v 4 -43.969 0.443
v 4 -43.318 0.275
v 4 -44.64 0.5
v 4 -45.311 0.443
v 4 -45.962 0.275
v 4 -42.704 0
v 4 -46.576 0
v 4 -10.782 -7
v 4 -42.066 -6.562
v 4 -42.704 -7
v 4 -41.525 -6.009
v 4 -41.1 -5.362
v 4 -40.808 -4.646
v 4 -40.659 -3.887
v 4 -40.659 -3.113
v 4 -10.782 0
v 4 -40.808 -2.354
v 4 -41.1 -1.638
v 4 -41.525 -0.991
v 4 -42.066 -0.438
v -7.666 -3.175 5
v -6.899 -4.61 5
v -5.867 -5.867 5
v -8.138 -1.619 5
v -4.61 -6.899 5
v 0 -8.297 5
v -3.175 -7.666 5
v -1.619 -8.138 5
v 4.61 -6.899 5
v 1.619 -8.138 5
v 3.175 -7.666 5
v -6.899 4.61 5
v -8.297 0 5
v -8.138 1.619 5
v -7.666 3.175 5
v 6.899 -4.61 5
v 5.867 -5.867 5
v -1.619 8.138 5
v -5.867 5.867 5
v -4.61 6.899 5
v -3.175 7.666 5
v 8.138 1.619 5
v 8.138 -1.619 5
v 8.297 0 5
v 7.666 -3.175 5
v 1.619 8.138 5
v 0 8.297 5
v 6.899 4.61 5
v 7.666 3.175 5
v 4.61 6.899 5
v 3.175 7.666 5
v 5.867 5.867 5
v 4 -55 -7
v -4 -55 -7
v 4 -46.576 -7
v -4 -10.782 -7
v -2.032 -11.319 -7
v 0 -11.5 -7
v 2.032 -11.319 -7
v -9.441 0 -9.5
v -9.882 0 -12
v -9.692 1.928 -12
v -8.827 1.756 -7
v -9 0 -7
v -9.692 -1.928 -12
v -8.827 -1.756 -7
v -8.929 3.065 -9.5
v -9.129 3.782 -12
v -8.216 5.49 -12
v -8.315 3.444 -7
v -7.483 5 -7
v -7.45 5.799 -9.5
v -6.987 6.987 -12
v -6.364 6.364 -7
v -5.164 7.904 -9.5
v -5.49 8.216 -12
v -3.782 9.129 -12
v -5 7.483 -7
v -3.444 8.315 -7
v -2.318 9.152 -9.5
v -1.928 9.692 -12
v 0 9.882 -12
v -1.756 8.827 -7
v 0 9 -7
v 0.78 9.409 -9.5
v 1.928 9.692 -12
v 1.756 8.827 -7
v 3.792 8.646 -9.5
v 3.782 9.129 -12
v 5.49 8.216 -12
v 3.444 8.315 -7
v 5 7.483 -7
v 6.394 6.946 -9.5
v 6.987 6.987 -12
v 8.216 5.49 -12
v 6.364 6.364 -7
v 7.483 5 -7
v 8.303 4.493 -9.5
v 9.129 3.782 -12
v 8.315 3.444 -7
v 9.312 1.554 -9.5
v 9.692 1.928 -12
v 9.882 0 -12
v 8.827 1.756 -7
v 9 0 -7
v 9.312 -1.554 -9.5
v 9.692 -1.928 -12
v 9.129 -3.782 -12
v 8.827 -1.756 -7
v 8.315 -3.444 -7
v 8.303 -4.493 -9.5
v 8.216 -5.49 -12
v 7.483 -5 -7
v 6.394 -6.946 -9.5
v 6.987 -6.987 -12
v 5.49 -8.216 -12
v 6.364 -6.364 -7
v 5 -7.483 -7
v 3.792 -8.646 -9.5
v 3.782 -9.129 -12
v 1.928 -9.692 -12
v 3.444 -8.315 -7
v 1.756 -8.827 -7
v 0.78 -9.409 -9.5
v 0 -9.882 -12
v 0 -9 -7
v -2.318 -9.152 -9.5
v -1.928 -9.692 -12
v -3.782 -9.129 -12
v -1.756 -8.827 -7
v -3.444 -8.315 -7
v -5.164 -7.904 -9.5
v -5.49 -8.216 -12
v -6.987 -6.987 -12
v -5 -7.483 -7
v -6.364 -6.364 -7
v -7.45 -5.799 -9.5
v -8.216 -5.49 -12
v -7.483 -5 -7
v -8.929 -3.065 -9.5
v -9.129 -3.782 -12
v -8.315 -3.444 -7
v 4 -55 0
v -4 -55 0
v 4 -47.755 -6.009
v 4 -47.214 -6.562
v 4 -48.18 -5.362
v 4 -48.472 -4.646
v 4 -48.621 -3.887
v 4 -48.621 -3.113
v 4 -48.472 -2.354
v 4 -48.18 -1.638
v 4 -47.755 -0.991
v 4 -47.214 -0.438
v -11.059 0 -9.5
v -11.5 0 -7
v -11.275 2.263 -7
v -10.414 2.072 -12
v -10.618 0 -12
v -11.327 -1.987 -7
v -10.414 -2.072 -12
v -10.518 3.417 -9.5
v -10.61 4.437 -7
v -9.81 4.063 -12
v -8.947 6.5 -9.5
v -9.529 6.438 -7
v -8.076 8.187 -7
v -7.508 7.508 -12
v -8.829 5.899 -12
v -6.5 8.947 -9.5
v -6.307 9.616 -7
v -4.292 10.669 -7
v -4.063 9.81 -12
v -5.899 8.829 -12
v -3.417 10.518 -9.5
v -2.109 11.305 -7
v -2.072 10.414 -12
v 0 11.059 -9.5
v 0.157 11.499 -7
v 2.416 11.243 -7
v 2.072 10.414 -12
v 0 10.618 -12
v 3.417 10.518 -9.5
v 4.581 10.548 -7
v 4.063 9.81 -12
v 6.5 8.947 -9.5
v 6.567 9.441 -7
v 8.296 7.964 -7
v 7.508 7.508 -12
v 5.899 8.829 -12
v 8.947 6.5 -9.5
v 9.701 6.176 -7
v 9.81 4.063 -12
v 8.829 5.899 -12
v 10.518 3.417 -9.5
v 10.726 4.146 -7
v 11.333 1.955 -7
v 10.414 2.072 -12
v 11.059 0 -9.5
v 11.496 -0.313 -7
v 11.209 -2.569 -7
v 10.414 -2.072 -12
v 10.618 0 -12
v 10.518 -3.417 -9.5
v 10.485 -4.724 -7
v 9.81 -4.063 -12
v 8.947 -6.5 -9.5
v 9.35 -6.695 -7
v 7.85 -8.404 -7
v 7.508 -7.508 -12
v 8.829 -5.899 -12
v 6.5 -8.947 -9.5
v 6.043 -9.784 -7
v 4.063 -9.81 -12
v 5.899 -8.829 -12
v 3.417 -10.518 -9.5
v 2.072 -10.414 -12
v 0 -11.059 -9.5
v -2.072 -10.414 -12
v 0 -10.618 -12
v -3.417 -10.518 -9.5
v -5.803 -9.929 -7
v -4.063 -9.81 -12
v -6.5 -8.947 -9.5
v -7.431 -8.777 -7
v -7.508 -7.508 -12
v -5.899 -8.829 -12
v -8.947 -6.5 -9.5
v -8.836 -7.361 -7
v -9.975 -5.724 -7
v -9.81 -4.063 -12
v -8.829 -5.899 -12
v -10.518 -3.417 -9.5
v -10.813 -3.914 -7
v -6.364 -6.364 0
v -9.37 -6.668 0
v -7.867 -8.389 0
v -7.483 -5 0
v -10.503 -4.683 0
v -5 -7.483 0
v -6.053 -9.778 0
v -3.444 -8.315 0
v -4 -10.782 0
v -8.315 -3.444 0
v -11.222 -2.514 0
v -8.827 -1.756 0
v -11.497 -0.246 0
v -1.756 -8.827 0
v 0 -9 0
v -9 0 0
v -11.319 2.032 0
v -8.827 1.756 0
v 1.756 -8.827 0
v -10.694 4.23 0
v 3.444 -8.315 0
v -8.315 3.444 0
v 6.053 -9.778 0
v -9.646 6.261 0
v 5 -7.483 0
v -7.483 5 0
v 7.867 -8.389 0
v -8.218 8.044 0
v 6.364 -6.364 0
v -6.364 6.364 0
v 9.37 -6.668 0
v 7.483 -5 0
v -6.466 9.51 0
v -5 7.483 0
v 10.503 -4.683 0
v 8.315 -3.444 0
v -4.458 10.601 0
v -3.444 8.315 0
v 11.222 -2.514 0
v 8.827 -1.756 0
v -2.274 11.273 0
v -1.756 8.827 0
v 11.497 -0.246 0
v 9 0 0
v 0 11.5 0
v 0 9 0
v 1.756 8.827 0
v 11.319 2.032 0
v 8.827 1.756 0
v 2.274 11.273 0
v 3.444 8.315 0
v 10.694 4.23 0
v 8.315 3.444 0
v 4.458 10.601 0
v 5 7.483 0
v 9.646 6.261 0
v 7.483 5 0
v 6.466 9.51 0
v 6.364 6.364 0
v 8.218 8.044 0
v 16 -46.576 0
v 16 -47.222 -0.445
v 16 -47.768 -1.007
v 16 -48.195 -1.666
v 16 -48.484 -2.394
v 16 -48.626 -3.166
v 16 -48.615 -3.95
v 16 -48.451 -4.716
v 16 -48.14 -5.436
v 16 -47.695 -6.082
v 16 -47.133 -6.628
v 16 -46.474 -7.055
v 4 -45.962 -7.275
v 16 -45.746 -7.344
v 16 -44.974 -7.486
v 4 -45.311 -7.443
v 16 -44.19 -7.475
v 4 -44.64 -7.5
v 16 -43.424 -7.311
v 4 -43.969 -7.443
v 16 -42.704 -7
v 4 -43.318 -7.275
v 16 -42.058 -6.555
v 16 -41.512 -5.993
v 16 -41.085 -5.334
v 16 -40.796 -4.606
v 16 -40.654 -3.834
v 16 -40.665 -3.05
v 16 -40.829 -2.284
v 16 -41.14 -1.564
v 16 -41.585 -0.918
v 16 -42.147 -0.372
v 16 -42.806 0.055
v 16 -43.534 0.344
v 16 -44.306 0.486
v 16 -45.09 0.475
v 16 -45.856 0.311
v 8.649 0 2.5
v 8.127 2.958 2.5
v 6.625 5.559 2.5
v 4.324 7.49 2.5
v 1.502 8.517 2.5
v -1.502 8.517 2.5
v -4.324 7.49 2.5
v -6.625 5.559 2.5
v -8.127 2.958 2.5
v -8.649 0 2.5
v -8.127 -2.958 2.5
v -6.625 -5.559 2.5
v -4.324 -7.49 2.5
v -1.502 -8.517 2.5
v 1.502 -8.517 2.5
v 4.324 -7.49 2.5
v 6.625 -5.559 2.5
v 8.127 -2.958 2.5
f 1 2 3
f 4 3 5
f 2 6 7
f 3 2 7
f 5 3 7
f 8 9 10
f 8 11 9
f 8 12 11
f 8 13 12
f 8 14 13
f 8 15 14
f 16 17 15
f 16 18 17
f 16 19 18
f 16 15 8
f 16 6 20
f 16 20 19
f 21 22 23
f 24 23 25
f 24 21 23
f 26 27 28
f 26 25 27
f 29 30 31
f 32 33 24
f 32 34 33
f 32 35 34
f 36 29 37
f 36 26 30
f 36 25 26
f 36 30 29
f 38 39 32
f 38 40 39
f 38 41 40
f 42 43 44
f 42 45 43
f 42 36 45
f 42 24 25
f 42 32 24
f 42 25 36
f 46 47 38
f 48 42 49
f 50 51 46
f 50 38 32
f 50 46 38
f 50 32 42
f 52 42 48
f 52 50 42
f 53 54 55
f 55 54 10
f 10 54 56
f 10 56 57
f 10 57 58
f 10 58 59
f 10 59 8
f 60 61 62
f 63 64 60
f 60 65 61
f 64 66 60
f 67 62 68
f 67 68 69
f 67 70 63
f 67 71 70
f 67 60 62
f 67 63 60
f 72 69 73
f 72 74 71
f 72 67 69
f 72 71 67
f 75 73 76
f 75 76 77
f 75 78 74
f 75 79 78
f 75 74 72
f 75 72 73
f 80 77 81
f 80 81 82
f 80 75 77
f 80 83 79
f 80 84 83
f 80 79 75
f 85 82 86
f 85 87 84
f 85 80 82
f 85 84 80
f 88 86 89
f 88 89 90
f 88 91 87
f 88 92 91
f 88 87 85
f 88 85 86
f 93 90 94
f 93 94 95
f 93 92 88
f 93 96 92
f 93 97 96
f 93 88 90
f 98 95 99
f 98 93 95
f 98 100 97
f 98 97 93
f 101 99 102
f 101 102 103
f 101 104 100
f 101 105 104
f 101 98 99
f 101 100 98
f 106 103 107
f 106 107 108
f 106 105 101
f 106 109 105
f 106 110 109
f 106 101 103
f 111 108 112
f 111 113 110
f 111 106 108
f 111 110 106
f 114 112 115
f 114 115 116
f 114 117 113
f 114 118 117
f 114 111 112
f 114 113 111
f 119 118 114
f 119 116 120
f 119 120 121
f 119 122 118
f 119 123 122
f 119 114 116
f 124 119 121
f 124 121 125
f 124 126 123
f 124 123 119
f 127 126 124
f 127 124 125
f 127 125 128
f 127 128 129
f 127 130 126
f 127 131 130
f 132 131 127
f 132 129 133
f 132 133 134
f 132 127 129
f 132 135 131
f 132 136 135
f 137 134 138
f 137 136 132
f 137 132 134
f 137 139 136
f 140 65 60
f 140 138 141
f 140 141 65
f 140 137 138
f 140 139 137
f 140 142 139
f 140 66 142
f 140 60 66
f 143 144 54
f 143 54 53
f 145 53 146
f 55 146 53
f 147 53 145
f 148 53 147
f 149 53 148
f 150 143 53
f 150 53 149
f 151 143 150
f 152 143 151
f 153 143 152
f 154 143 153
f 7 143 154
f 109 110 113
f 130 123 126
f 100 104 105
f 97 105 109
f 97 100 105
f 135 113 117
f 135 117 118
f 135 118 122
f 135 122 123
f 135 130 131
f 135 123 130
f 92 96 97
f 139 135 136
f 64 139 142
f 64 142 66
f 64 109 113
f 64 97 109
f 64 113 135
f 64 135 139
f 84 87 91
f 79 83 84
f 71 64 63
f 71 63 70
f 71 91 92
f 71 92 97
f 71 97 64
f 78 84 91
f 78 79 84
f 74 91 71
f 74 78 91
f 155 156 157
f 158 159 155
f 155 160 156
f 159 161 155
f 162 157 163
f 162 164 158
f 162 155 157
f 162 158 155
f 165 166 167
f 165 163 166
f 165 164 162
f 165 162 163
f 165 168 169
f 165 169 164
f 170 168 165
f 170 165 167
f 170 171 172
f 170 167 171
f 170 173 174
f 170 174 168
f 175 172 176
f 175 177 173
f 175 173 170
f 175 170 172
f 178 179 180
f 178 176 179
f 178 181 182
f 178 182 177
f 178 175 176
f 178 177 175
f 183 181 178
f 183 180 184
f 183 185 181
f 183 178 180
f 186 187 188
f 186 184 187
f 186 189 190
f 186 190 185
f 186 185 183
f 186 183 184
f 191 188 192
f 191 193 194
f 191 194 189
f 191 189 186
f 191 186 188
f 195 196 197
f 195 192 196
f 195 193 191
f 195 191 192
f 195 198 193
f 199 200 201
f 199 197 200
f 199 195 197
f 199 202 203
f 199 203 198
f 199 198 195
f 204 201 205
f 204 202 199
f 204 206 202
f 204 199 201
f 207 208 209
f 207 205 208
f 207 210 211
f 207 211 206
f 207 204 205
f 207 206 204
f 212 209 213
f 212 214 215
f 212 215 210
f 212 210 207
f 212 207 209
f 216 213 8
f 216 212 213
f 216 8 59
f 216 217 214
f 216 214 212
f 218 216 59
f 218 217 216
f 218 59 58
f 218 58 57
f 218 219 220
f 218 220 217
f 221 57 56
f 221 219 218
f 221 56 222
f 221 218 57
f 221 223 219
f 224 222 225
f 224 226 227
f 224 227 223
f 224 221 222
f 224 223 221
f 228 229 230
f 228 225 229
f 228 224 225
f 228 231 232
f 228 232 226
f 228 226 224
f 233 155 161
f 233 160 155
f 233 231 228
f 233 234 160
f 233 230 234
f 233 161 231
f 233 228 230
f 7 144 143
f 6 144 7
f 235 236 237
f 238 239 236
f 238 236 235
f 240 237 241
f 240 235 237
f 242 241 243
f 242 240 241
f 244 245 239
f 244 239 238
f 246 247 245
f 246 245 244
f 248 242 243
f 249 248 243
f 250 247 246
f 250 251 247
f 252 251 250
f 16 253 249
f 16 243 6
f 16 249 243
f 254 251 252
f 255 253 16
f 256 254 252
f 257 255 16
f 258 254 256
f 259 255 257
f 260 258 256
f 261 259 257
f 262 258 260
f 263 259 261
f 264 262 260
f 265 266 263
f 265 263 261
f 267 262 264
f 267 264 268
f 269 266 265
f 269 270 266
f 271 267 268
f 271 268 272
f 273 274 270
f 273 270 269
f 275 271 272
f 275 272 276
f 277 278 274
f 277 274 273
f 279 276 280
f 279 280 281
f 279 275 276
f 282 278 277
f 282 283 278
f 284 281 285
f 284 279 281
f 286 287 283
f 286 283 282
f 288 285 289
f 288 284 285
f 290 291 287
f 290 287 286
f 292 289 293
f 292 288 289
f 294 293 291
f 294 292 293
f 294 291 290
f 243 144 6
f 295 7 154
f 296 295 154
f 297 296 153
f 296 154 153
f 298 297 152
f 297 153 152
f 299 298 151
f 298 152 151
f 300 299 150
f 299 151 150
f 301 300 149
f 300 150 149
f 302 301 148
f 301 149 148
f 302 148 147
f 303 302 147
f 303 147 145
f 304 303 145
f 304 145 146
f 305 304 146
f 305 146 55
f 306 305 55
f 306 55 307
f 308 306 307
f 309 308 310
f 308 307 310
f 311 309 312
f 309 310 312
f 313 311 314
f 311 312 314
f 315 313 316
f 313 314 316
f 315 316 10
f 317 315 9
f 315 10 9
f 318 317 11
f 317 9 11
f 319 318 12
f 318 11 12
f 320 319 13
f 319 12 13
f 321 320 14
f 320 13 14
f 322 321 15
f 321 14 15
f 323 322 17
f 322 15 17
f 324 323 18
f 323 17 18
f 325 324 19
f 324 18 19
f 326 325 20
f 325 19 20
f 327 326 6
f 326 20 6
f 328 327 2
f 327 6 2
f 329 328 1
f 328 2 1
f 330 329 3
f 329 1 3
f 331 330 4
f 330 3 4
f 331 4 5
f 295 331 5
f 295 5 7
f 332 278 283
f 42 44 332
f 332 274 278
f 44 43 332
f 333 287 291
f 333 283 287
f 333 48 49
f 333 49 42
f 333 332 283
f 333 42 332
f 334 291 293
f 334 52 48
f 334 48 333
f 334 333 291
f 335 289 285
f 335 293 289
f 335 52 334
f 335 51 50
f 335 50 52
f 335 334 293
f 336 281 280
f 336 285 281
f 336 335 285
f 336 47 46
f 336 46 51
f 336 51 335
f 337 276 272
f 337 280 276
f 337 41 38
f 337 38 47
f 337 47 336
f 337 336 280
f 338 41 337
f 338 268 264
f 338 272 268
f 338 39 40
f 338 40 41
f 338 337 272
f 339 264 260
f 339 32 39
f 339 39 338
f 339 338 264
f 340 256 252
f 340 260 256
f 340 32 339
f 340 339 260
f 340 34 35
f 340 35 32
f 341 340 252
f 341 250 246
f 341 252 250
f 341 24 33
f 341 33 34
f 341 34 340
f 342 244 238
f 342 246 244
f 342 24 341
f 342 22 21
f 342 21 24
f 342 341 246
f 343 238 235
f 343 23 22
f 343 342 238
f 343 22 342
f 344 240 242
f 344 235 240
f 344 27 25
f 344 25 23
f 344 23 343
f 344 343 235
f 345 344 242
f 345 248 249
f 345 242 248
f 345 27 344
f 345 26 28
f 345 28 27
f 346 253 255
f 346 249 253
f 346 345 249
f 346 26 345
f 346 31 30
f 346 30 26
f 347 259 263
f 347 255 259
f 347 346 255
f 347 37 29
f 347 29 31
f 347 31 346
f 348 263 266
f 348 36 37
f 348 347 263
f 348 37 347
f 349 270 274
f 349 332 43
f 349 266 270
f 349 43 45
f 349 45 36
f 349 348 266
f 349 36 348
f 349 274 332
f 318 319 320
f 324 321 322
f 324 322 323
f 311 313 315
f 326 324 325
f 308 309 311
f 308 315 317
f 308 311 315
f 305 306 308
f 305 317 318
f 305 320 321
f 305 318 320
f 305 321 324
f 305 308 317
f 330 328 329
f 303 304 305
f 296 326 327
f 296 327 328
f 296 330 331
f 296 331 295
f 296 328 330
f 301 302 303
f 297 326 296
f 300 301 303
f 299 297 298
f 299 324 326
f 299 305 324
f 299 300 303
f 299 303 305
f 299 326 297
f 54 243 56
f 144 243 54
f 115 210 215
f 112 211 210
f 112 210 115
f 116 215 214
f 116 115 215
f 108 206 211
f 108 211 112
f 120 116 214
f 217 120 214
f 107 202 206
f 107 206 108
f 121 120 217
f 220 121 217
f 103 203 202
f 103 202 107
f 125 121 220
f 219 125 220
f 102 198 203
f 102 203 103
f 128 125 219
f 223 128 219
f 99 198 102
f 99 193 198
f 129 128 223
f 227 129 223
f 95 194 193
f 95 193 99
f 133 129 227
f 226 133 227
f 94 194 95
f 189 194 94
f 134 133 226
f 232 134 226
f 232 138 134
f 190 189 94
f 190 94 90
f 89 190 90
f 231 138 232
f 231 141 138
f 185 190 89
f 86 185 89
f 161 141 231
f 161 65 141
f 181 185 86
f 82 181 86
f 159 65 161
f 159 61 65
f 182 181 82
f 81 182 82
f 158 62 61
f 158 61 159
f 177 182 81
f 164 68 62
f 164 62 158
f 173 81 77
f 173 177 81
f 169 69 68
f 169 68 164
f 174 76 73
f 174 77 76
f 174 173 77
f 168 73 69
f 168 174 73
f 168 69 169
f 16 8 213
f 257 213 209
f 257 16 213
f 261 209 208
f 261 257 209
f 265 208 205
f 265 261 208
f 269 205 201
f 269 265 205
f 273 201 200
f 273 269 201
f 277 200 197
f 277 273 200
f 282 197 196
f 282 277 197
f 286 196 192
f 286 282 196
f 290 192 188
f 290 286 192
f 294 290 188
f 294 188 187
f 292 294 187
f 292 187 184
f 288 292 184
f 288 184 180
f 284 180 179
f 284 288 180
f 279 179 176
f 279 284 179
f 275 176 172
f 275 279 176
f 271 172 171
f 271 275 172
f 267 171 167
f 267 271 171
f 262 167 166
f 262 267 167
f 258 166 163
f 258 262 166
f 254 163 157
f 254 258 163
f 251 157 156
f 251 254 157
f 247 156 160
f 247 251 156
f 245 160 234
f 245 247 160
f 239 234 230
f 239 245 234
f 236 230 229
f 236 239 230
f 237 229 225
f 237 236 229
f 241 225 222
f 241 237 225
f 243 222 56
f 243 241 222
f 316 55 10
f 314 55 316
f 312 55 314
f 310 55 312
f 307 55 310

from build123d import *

# Parameters (mm, degrees)
BOSS_EXTRUDE1_DEPTH = 7
SKETCH2_R           = 9
BOSS_EXTRUDE2_DEPTH = 5
BOSS_EXTRUDE2_TAPER = 8
SKETCH4_R           = 11.5
BOSS_EXTRUDE3_DEPTH = 5
BOSS_EXTRUDE3_TAPER = 10
SKETCH5_R           = 4
BOSS_EXTRUDE4_DEPTH = 12
SKETCH6_R           = 9
CUT_EXTRUDE1_DEPTH  = 5
SKETCH7_R           = 9
CUT_EXTRUDE3_DEPTH  = 5
CUT_EXTRUDE3_DRAFT  = -10


with BuildPart() as part:
    # Sketch1 → Boss-Extrude1 (new body)
    with BuildSketch(Plane.XY):
        with BuildLine():
            Line((-4, -10.781929326), (-4, -55))
            Line((-4, -55), (4, -55))
            Line((4, -55), (4, -10.781929326))
            ThreePointArc((4, -10.781929326), (0, 11.5), (-4, -10.781929326))
        make_face()
    extrude(amount=-BOSS_EXTRUDE1_DEPTH)

    # Sketch2 → Boss-Extrude2 (add)
    with BuildSketch(Plane.XY):
        Circle(SKETCH2_R)
    extrude(amount=BOSS_EXTRUDE2_DEPTH, taper=BOSS_EXTRUDE2_TAPER)

    # Sketch4 → Boss-Extrude3 (add)
    with BuildSketch(Plane(origin=(0, 0, -7), x_dir=(-1, 0, 0), z_dir=(0, 0, -1))):
        Circle(SKETCH4_R)
    extrude(amount=BOSS_EXTRUDE3_DEPTH, taper=BOSS_EXTRUDE3_TAPER)

    # Sketch5 → Boss-Extrude4 (add)
    with BuildSketch(Plane(origin=(4, 0, 0), x_dir=(0, 0, -1), z_dir=(1, 0, 0))):
        with Locations(Location((3.5, -44.64, 0), (0, 0, 208.955024372))):
            Circle(SKETCH5_R)
    extrude(amount=BOSS_EXTRUDE4_DEPTH)

    # Sketch6 → Cut-Extrude1 (cut)
    with BuildSketch(Plane(origin=(0, 0, -12), x_dir=(-1, 0, 0), z_dir=(0, 0, -1))):
        Circle(SKETCH6_R)
    extrude(amount=-CUT_EXTRUDE1_DEPTH, mode=Mode.SUBTRACT)


with BuildPart() as cut_extrude3_tool:
    # Sketch7 → Cut-Extrude3 (with draft: the straight prism first)
    with BuildSketch(Plane(origin=(0, 0, -7), x_dir=(-1, 0, 0), z_dir=(0, 0, -1))):
        Circle(SKETCH7_R)
    extrude(amount=CUT_EXTRUDE3_DEPTH)
    # Cut-Extrude3: the draft: its side faces are tilted about the plane it starts from
    cut_extrude3_sides = [cut_extrude3_tool.faces().sort_by_distance(p)[0] for p in [
        (9, 0, -9.5),
    ]]
    draft(cut_extrude3_sides, Plane(origin=(0, 0, -7), x_dir=(-1, 0, 0), z_dir=(0, 0, -1)), CUT_EXTRUDE3_DRAFT)


with BuildPart() as part_1:
    add(part.part)

    # Cut-Extrude3: cut by cut_extrude3_tool
    add(cut_extrude3_tool.part, mode=Mode.SUBTRACT)


solid = part_1.part
